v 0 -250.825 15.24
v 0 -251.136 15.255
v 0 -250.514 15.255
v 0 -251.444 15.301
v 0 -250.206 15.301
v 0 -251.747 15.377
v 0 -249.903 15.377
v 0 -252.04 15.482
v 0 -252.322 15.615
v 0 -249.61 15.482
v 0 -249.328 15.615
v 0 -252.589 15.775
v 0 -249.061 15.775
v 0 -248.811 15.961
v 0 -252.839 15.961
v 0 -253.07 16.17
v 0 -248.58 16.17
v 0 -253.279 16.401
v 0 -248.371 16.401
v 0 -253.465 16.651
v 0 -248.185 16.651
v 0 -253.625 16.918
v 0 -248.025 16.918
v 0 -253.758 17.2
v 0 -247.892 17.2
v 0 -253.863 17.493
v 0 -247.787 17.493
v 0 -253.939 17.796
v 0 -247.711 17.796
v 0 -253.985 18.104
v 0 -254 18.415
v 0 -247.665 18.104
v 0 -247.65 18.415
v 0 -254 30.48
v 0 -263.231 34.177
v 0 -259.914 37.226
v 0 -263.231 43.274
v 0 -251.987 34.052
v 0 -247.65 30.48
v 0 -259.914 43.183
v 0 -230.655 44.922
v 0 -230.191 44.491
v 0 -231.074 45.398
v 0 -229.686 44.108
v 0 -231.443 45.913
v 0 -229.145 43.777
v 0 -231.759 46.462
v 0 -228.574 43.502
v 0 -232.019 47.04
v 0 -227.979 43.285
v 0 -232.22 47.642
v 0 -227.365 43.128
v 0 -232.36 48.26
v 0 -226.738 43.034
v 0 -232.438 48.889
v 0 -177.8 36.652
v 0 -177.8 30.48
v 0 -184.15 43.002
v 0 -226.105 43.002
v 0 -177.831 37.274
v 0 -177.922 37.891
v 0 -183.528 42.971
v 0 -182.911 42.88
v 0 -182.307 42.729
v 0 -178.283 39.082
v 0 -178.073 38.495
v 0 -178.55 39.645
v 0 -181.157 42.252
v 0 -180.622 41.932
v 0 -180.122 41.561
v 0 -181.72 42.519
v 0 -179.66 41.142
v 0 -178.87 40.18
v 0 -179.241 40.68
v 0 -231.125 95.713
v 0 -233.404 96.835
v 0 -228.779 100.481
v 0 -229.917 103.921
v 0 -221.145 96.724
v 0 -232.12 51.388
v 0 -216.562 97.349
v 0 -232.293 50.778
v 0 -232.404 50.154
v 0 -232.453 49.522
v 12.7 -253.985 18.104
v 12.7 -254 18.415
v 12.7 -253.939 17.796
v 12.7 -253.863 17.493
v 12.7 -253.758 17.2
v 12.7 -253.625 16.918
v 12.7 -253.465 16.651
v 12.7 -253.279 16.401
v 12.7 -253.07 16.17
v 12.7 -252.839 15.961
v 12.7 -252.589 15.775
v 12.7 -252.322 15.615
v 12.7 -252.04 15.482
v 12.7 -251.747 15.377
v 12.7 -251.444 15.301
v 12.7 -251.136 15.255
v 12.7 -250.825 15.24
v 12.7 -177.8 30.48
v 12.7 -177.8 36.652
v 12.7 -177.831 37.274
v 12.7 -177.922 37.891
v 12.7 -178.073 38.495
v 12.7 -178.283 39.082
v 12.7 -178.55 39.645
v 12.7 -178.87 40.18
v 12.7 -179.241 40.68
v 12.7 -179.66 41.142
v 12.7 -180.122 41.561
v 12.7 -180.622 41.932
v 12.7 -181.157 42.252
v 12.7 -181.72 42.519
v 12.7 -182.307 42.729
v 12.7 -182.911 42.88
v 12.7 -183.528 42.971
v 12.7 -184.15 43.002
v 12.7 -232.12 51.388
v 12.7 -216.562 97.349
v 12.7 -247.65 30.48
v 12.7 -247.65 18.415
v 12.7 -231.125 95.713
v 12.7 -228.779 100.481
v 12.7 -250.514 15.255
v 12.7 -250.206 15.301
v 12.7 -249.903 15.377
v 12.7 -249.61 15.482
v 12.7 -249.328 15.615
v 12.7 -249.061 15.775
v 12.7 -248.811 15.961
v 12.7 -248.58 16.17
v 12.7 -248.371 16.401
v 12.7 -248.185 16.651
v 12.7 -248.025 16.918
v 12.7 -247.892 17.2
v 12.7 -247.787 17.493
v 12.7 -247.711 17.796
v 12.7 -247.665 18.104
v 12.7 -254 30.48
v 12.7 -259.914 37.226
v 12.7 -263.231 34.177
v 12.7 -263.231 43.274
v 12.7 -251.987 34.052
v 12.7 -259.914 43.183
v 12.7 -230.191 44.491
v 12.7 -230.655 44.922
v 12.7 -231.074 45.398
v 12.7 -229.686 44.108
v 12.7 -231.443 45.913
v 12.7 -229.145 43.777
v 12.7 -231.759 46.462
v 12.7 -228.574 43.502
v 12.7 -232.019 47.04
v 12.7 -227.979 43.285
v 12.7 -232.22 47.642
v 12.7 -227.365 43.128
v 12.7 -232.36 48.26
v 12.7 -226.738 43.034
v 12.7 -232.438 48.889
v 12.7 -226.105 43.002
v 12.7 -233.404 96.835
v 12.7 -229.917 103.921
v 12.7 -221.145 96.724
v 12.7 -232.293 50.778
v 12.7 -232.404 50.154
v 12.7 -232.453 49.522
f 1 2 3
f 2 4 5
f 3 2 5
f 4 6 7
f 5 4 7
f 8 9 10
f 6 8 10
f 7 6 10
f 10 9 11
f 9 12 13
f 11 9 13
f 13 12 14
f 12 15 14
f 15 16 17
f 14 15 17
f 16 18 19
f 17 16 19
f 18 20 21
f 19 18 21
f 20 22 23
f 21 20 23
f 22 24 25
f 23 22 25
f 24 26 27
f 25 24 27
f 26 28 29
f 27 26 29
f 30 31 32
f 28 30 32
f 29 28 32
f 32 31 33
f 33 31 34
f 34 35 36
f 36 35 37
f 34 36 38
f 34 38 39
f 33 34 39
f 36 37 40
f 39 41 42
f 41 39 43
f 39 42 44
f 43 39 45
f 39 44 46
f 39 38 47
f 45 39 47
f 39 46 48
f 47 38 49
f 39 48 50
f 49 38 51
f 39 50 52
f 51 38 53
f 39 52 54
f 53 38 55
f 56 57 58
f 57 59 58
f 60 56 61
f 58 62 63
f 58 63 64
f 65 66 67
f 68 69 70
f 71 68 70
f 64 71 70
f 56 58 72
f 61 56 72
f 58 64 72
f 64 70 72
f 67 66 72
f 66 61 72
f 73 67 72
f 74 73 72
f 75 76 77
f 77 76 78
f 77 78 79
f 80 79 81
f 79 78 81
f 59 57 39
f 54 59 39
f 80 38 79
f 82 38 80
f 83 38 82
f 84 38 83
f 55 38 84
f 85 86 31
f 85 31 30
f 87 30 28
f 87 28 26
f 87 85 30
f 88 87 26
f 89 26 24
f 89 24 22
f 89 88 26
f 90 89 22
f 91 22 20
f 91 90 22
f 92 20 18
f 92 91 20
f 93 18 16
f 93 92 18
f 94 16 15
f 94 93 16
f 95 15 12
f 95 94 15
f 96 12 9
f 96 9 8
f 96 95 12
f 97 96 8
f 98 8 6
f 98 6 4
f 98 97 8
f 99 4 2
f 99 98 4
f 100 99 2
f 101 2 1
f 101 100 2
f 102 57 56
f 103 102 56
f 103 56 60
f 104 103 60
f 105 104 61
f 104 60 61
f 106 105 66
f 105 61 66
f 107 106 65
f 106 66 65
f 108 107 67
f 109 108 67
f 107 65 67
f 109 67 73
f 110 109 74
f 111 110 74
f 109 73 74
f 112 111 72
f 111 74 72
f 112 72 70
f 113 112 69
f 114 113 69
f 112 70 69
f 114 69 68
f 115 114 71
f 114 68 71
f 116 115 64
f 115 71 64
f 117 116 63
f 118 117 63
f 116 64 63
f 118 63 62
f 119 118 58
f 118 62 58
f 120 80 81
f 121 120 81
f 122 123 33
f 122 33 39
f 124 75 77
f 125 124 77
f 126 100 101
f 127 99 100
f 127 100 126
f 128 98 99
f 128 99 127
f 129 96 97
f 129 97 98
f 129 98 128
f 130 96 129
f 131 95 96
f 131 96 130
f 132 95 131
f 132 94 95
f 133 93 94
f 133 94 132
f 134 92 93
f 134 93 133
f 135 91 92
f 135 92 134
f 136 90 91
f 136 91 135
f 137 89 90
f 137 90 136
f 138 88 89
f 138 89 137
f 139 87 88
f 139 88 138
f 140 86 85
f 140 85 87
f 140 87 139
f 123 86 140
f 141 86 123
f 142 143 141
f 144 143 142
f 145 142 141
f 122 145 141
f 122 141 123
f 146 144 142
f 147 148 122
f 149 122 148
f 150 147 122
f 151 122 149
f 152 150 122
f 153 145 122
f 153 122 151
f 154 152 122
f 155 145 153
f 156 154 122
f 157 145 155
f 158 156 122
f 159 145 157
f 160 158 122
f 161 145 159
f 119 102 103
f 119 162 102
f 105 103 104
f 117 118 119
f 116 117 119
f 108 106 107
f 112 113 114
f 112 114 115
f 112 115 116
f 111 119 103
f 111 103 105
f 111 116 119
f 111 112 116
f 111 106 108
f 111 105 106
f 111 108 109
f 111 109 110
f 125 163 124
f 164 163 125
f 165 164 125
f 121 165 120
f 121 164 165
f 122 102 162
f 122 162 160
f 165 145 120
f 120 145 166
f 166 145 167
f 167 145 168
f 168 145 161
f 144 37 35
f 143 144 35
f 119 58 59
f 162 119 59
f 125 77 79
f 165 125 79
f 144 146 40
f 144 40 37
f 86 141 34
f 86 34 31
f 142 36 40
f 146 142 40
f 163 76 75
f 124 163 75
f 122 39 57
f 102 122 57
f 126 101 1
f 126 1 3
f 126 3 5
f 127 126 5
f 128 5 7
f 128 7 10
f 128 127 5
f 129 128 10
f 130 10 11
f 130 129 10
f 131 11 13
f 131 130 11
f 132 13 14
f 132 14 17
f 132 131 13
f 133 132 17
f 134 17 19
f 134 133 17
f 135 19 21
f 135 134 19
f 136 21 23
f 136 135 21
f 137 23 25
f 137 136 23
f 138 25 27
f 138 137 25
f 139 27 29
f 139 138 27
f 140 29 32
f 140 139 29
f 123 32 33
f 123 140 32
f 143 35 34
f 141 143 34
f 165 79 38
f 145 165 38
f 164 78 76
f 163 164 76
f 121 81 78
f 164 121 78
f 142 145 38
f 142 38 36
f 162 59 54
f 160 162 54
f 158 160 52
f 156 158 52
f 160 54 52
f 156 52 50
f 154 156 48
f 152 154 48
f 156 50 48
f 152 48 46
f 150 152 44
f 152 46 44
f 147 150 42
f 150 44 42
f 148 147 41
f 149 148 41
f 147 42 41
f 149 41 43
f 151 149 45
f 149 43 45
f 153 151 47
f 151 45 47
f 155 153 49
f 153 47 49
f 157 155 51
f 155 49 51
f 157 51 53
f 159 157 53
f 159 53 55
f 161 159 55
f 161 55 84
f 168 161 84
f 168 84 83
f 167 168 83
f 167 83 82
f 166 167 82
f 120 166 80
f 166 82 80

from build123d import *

# Parameters (mm, degrees)
F1_DEPTH = 12.7
F3_DEPTH = 12.7


with BuildPart() as f1:
    # F0 (on Right) → F1 (new body)
    with BuildSketch(Plane.YZ):
        with BuildLine():
            Line((-254, 30.48), (-177.8, 30.48))
            Line((-177.8, 30.48), (-177.8, 36.651972))
            ThreePointArc((-177.8, 36.651972), (-179.659872, 41.1421), (-184.15, 43.001972))
            Line((-184.15, 43.001972), (-226.105012, 43.001972))
            ThreePointArc((-226.105012, 43.001972), (-231.264992, 45.651011), (-232.119778, 51.387921))
            Line((-232.119778, 51.387921), (-216.562416, 97.348726))
            Line((-216.562416, 97.348726), (-229.917262, 103.920899))
            Line((-229.917262, 103.920899), (-233.404353, 96.835028))
            Line((-233.404353, 96.835028), (-231.125369, 95.713497))
            Line((-231.125369, 95.713497), (-228.779319, 100.480739))
            Line((-228.779319, 100.480739), (-221.144723, 96.723609))
            Line((-221.144723, 96.723609), (-251.986832, 34.051552))
            Line((-251.986832, 34.051552), (-259.914278, 37.22636))
            Line((-259.914278, 37.22636), (-259.914278, 43.183118))
            Line((-259.914278, 43.183118), (-263.23086, 43.274231))
            Line((-263.23086, 43.274231), (-263.23086, 34.176804))
            Line((-263.23086, 34.176804), (-254, 30.48))
        make_face()
    extrude(amount=F1_DEPTH)

    # F2 (on face) → F3 (join)
    with BuildSketch(Plane.YZ.offset(12.7)):
        with BuildLine():
            Line((-247.65, 30.48), (-254, 30.48))
            Line((-254, 30.48), (-254, 18.415))
            ThreePointArc((-254, 18.415), (-253.070064, 16.169936), (-250.825, 15.24))
            ThreePointArc((-250.825, 15.24), (-248.579936, 16.169936), (-247.65, 18.415))
            Line((-247.65, 18.415), (-247.65, 30.48))
        make_face()
    extrude(amount=-F3_DEPTH)


solid = f1.part
